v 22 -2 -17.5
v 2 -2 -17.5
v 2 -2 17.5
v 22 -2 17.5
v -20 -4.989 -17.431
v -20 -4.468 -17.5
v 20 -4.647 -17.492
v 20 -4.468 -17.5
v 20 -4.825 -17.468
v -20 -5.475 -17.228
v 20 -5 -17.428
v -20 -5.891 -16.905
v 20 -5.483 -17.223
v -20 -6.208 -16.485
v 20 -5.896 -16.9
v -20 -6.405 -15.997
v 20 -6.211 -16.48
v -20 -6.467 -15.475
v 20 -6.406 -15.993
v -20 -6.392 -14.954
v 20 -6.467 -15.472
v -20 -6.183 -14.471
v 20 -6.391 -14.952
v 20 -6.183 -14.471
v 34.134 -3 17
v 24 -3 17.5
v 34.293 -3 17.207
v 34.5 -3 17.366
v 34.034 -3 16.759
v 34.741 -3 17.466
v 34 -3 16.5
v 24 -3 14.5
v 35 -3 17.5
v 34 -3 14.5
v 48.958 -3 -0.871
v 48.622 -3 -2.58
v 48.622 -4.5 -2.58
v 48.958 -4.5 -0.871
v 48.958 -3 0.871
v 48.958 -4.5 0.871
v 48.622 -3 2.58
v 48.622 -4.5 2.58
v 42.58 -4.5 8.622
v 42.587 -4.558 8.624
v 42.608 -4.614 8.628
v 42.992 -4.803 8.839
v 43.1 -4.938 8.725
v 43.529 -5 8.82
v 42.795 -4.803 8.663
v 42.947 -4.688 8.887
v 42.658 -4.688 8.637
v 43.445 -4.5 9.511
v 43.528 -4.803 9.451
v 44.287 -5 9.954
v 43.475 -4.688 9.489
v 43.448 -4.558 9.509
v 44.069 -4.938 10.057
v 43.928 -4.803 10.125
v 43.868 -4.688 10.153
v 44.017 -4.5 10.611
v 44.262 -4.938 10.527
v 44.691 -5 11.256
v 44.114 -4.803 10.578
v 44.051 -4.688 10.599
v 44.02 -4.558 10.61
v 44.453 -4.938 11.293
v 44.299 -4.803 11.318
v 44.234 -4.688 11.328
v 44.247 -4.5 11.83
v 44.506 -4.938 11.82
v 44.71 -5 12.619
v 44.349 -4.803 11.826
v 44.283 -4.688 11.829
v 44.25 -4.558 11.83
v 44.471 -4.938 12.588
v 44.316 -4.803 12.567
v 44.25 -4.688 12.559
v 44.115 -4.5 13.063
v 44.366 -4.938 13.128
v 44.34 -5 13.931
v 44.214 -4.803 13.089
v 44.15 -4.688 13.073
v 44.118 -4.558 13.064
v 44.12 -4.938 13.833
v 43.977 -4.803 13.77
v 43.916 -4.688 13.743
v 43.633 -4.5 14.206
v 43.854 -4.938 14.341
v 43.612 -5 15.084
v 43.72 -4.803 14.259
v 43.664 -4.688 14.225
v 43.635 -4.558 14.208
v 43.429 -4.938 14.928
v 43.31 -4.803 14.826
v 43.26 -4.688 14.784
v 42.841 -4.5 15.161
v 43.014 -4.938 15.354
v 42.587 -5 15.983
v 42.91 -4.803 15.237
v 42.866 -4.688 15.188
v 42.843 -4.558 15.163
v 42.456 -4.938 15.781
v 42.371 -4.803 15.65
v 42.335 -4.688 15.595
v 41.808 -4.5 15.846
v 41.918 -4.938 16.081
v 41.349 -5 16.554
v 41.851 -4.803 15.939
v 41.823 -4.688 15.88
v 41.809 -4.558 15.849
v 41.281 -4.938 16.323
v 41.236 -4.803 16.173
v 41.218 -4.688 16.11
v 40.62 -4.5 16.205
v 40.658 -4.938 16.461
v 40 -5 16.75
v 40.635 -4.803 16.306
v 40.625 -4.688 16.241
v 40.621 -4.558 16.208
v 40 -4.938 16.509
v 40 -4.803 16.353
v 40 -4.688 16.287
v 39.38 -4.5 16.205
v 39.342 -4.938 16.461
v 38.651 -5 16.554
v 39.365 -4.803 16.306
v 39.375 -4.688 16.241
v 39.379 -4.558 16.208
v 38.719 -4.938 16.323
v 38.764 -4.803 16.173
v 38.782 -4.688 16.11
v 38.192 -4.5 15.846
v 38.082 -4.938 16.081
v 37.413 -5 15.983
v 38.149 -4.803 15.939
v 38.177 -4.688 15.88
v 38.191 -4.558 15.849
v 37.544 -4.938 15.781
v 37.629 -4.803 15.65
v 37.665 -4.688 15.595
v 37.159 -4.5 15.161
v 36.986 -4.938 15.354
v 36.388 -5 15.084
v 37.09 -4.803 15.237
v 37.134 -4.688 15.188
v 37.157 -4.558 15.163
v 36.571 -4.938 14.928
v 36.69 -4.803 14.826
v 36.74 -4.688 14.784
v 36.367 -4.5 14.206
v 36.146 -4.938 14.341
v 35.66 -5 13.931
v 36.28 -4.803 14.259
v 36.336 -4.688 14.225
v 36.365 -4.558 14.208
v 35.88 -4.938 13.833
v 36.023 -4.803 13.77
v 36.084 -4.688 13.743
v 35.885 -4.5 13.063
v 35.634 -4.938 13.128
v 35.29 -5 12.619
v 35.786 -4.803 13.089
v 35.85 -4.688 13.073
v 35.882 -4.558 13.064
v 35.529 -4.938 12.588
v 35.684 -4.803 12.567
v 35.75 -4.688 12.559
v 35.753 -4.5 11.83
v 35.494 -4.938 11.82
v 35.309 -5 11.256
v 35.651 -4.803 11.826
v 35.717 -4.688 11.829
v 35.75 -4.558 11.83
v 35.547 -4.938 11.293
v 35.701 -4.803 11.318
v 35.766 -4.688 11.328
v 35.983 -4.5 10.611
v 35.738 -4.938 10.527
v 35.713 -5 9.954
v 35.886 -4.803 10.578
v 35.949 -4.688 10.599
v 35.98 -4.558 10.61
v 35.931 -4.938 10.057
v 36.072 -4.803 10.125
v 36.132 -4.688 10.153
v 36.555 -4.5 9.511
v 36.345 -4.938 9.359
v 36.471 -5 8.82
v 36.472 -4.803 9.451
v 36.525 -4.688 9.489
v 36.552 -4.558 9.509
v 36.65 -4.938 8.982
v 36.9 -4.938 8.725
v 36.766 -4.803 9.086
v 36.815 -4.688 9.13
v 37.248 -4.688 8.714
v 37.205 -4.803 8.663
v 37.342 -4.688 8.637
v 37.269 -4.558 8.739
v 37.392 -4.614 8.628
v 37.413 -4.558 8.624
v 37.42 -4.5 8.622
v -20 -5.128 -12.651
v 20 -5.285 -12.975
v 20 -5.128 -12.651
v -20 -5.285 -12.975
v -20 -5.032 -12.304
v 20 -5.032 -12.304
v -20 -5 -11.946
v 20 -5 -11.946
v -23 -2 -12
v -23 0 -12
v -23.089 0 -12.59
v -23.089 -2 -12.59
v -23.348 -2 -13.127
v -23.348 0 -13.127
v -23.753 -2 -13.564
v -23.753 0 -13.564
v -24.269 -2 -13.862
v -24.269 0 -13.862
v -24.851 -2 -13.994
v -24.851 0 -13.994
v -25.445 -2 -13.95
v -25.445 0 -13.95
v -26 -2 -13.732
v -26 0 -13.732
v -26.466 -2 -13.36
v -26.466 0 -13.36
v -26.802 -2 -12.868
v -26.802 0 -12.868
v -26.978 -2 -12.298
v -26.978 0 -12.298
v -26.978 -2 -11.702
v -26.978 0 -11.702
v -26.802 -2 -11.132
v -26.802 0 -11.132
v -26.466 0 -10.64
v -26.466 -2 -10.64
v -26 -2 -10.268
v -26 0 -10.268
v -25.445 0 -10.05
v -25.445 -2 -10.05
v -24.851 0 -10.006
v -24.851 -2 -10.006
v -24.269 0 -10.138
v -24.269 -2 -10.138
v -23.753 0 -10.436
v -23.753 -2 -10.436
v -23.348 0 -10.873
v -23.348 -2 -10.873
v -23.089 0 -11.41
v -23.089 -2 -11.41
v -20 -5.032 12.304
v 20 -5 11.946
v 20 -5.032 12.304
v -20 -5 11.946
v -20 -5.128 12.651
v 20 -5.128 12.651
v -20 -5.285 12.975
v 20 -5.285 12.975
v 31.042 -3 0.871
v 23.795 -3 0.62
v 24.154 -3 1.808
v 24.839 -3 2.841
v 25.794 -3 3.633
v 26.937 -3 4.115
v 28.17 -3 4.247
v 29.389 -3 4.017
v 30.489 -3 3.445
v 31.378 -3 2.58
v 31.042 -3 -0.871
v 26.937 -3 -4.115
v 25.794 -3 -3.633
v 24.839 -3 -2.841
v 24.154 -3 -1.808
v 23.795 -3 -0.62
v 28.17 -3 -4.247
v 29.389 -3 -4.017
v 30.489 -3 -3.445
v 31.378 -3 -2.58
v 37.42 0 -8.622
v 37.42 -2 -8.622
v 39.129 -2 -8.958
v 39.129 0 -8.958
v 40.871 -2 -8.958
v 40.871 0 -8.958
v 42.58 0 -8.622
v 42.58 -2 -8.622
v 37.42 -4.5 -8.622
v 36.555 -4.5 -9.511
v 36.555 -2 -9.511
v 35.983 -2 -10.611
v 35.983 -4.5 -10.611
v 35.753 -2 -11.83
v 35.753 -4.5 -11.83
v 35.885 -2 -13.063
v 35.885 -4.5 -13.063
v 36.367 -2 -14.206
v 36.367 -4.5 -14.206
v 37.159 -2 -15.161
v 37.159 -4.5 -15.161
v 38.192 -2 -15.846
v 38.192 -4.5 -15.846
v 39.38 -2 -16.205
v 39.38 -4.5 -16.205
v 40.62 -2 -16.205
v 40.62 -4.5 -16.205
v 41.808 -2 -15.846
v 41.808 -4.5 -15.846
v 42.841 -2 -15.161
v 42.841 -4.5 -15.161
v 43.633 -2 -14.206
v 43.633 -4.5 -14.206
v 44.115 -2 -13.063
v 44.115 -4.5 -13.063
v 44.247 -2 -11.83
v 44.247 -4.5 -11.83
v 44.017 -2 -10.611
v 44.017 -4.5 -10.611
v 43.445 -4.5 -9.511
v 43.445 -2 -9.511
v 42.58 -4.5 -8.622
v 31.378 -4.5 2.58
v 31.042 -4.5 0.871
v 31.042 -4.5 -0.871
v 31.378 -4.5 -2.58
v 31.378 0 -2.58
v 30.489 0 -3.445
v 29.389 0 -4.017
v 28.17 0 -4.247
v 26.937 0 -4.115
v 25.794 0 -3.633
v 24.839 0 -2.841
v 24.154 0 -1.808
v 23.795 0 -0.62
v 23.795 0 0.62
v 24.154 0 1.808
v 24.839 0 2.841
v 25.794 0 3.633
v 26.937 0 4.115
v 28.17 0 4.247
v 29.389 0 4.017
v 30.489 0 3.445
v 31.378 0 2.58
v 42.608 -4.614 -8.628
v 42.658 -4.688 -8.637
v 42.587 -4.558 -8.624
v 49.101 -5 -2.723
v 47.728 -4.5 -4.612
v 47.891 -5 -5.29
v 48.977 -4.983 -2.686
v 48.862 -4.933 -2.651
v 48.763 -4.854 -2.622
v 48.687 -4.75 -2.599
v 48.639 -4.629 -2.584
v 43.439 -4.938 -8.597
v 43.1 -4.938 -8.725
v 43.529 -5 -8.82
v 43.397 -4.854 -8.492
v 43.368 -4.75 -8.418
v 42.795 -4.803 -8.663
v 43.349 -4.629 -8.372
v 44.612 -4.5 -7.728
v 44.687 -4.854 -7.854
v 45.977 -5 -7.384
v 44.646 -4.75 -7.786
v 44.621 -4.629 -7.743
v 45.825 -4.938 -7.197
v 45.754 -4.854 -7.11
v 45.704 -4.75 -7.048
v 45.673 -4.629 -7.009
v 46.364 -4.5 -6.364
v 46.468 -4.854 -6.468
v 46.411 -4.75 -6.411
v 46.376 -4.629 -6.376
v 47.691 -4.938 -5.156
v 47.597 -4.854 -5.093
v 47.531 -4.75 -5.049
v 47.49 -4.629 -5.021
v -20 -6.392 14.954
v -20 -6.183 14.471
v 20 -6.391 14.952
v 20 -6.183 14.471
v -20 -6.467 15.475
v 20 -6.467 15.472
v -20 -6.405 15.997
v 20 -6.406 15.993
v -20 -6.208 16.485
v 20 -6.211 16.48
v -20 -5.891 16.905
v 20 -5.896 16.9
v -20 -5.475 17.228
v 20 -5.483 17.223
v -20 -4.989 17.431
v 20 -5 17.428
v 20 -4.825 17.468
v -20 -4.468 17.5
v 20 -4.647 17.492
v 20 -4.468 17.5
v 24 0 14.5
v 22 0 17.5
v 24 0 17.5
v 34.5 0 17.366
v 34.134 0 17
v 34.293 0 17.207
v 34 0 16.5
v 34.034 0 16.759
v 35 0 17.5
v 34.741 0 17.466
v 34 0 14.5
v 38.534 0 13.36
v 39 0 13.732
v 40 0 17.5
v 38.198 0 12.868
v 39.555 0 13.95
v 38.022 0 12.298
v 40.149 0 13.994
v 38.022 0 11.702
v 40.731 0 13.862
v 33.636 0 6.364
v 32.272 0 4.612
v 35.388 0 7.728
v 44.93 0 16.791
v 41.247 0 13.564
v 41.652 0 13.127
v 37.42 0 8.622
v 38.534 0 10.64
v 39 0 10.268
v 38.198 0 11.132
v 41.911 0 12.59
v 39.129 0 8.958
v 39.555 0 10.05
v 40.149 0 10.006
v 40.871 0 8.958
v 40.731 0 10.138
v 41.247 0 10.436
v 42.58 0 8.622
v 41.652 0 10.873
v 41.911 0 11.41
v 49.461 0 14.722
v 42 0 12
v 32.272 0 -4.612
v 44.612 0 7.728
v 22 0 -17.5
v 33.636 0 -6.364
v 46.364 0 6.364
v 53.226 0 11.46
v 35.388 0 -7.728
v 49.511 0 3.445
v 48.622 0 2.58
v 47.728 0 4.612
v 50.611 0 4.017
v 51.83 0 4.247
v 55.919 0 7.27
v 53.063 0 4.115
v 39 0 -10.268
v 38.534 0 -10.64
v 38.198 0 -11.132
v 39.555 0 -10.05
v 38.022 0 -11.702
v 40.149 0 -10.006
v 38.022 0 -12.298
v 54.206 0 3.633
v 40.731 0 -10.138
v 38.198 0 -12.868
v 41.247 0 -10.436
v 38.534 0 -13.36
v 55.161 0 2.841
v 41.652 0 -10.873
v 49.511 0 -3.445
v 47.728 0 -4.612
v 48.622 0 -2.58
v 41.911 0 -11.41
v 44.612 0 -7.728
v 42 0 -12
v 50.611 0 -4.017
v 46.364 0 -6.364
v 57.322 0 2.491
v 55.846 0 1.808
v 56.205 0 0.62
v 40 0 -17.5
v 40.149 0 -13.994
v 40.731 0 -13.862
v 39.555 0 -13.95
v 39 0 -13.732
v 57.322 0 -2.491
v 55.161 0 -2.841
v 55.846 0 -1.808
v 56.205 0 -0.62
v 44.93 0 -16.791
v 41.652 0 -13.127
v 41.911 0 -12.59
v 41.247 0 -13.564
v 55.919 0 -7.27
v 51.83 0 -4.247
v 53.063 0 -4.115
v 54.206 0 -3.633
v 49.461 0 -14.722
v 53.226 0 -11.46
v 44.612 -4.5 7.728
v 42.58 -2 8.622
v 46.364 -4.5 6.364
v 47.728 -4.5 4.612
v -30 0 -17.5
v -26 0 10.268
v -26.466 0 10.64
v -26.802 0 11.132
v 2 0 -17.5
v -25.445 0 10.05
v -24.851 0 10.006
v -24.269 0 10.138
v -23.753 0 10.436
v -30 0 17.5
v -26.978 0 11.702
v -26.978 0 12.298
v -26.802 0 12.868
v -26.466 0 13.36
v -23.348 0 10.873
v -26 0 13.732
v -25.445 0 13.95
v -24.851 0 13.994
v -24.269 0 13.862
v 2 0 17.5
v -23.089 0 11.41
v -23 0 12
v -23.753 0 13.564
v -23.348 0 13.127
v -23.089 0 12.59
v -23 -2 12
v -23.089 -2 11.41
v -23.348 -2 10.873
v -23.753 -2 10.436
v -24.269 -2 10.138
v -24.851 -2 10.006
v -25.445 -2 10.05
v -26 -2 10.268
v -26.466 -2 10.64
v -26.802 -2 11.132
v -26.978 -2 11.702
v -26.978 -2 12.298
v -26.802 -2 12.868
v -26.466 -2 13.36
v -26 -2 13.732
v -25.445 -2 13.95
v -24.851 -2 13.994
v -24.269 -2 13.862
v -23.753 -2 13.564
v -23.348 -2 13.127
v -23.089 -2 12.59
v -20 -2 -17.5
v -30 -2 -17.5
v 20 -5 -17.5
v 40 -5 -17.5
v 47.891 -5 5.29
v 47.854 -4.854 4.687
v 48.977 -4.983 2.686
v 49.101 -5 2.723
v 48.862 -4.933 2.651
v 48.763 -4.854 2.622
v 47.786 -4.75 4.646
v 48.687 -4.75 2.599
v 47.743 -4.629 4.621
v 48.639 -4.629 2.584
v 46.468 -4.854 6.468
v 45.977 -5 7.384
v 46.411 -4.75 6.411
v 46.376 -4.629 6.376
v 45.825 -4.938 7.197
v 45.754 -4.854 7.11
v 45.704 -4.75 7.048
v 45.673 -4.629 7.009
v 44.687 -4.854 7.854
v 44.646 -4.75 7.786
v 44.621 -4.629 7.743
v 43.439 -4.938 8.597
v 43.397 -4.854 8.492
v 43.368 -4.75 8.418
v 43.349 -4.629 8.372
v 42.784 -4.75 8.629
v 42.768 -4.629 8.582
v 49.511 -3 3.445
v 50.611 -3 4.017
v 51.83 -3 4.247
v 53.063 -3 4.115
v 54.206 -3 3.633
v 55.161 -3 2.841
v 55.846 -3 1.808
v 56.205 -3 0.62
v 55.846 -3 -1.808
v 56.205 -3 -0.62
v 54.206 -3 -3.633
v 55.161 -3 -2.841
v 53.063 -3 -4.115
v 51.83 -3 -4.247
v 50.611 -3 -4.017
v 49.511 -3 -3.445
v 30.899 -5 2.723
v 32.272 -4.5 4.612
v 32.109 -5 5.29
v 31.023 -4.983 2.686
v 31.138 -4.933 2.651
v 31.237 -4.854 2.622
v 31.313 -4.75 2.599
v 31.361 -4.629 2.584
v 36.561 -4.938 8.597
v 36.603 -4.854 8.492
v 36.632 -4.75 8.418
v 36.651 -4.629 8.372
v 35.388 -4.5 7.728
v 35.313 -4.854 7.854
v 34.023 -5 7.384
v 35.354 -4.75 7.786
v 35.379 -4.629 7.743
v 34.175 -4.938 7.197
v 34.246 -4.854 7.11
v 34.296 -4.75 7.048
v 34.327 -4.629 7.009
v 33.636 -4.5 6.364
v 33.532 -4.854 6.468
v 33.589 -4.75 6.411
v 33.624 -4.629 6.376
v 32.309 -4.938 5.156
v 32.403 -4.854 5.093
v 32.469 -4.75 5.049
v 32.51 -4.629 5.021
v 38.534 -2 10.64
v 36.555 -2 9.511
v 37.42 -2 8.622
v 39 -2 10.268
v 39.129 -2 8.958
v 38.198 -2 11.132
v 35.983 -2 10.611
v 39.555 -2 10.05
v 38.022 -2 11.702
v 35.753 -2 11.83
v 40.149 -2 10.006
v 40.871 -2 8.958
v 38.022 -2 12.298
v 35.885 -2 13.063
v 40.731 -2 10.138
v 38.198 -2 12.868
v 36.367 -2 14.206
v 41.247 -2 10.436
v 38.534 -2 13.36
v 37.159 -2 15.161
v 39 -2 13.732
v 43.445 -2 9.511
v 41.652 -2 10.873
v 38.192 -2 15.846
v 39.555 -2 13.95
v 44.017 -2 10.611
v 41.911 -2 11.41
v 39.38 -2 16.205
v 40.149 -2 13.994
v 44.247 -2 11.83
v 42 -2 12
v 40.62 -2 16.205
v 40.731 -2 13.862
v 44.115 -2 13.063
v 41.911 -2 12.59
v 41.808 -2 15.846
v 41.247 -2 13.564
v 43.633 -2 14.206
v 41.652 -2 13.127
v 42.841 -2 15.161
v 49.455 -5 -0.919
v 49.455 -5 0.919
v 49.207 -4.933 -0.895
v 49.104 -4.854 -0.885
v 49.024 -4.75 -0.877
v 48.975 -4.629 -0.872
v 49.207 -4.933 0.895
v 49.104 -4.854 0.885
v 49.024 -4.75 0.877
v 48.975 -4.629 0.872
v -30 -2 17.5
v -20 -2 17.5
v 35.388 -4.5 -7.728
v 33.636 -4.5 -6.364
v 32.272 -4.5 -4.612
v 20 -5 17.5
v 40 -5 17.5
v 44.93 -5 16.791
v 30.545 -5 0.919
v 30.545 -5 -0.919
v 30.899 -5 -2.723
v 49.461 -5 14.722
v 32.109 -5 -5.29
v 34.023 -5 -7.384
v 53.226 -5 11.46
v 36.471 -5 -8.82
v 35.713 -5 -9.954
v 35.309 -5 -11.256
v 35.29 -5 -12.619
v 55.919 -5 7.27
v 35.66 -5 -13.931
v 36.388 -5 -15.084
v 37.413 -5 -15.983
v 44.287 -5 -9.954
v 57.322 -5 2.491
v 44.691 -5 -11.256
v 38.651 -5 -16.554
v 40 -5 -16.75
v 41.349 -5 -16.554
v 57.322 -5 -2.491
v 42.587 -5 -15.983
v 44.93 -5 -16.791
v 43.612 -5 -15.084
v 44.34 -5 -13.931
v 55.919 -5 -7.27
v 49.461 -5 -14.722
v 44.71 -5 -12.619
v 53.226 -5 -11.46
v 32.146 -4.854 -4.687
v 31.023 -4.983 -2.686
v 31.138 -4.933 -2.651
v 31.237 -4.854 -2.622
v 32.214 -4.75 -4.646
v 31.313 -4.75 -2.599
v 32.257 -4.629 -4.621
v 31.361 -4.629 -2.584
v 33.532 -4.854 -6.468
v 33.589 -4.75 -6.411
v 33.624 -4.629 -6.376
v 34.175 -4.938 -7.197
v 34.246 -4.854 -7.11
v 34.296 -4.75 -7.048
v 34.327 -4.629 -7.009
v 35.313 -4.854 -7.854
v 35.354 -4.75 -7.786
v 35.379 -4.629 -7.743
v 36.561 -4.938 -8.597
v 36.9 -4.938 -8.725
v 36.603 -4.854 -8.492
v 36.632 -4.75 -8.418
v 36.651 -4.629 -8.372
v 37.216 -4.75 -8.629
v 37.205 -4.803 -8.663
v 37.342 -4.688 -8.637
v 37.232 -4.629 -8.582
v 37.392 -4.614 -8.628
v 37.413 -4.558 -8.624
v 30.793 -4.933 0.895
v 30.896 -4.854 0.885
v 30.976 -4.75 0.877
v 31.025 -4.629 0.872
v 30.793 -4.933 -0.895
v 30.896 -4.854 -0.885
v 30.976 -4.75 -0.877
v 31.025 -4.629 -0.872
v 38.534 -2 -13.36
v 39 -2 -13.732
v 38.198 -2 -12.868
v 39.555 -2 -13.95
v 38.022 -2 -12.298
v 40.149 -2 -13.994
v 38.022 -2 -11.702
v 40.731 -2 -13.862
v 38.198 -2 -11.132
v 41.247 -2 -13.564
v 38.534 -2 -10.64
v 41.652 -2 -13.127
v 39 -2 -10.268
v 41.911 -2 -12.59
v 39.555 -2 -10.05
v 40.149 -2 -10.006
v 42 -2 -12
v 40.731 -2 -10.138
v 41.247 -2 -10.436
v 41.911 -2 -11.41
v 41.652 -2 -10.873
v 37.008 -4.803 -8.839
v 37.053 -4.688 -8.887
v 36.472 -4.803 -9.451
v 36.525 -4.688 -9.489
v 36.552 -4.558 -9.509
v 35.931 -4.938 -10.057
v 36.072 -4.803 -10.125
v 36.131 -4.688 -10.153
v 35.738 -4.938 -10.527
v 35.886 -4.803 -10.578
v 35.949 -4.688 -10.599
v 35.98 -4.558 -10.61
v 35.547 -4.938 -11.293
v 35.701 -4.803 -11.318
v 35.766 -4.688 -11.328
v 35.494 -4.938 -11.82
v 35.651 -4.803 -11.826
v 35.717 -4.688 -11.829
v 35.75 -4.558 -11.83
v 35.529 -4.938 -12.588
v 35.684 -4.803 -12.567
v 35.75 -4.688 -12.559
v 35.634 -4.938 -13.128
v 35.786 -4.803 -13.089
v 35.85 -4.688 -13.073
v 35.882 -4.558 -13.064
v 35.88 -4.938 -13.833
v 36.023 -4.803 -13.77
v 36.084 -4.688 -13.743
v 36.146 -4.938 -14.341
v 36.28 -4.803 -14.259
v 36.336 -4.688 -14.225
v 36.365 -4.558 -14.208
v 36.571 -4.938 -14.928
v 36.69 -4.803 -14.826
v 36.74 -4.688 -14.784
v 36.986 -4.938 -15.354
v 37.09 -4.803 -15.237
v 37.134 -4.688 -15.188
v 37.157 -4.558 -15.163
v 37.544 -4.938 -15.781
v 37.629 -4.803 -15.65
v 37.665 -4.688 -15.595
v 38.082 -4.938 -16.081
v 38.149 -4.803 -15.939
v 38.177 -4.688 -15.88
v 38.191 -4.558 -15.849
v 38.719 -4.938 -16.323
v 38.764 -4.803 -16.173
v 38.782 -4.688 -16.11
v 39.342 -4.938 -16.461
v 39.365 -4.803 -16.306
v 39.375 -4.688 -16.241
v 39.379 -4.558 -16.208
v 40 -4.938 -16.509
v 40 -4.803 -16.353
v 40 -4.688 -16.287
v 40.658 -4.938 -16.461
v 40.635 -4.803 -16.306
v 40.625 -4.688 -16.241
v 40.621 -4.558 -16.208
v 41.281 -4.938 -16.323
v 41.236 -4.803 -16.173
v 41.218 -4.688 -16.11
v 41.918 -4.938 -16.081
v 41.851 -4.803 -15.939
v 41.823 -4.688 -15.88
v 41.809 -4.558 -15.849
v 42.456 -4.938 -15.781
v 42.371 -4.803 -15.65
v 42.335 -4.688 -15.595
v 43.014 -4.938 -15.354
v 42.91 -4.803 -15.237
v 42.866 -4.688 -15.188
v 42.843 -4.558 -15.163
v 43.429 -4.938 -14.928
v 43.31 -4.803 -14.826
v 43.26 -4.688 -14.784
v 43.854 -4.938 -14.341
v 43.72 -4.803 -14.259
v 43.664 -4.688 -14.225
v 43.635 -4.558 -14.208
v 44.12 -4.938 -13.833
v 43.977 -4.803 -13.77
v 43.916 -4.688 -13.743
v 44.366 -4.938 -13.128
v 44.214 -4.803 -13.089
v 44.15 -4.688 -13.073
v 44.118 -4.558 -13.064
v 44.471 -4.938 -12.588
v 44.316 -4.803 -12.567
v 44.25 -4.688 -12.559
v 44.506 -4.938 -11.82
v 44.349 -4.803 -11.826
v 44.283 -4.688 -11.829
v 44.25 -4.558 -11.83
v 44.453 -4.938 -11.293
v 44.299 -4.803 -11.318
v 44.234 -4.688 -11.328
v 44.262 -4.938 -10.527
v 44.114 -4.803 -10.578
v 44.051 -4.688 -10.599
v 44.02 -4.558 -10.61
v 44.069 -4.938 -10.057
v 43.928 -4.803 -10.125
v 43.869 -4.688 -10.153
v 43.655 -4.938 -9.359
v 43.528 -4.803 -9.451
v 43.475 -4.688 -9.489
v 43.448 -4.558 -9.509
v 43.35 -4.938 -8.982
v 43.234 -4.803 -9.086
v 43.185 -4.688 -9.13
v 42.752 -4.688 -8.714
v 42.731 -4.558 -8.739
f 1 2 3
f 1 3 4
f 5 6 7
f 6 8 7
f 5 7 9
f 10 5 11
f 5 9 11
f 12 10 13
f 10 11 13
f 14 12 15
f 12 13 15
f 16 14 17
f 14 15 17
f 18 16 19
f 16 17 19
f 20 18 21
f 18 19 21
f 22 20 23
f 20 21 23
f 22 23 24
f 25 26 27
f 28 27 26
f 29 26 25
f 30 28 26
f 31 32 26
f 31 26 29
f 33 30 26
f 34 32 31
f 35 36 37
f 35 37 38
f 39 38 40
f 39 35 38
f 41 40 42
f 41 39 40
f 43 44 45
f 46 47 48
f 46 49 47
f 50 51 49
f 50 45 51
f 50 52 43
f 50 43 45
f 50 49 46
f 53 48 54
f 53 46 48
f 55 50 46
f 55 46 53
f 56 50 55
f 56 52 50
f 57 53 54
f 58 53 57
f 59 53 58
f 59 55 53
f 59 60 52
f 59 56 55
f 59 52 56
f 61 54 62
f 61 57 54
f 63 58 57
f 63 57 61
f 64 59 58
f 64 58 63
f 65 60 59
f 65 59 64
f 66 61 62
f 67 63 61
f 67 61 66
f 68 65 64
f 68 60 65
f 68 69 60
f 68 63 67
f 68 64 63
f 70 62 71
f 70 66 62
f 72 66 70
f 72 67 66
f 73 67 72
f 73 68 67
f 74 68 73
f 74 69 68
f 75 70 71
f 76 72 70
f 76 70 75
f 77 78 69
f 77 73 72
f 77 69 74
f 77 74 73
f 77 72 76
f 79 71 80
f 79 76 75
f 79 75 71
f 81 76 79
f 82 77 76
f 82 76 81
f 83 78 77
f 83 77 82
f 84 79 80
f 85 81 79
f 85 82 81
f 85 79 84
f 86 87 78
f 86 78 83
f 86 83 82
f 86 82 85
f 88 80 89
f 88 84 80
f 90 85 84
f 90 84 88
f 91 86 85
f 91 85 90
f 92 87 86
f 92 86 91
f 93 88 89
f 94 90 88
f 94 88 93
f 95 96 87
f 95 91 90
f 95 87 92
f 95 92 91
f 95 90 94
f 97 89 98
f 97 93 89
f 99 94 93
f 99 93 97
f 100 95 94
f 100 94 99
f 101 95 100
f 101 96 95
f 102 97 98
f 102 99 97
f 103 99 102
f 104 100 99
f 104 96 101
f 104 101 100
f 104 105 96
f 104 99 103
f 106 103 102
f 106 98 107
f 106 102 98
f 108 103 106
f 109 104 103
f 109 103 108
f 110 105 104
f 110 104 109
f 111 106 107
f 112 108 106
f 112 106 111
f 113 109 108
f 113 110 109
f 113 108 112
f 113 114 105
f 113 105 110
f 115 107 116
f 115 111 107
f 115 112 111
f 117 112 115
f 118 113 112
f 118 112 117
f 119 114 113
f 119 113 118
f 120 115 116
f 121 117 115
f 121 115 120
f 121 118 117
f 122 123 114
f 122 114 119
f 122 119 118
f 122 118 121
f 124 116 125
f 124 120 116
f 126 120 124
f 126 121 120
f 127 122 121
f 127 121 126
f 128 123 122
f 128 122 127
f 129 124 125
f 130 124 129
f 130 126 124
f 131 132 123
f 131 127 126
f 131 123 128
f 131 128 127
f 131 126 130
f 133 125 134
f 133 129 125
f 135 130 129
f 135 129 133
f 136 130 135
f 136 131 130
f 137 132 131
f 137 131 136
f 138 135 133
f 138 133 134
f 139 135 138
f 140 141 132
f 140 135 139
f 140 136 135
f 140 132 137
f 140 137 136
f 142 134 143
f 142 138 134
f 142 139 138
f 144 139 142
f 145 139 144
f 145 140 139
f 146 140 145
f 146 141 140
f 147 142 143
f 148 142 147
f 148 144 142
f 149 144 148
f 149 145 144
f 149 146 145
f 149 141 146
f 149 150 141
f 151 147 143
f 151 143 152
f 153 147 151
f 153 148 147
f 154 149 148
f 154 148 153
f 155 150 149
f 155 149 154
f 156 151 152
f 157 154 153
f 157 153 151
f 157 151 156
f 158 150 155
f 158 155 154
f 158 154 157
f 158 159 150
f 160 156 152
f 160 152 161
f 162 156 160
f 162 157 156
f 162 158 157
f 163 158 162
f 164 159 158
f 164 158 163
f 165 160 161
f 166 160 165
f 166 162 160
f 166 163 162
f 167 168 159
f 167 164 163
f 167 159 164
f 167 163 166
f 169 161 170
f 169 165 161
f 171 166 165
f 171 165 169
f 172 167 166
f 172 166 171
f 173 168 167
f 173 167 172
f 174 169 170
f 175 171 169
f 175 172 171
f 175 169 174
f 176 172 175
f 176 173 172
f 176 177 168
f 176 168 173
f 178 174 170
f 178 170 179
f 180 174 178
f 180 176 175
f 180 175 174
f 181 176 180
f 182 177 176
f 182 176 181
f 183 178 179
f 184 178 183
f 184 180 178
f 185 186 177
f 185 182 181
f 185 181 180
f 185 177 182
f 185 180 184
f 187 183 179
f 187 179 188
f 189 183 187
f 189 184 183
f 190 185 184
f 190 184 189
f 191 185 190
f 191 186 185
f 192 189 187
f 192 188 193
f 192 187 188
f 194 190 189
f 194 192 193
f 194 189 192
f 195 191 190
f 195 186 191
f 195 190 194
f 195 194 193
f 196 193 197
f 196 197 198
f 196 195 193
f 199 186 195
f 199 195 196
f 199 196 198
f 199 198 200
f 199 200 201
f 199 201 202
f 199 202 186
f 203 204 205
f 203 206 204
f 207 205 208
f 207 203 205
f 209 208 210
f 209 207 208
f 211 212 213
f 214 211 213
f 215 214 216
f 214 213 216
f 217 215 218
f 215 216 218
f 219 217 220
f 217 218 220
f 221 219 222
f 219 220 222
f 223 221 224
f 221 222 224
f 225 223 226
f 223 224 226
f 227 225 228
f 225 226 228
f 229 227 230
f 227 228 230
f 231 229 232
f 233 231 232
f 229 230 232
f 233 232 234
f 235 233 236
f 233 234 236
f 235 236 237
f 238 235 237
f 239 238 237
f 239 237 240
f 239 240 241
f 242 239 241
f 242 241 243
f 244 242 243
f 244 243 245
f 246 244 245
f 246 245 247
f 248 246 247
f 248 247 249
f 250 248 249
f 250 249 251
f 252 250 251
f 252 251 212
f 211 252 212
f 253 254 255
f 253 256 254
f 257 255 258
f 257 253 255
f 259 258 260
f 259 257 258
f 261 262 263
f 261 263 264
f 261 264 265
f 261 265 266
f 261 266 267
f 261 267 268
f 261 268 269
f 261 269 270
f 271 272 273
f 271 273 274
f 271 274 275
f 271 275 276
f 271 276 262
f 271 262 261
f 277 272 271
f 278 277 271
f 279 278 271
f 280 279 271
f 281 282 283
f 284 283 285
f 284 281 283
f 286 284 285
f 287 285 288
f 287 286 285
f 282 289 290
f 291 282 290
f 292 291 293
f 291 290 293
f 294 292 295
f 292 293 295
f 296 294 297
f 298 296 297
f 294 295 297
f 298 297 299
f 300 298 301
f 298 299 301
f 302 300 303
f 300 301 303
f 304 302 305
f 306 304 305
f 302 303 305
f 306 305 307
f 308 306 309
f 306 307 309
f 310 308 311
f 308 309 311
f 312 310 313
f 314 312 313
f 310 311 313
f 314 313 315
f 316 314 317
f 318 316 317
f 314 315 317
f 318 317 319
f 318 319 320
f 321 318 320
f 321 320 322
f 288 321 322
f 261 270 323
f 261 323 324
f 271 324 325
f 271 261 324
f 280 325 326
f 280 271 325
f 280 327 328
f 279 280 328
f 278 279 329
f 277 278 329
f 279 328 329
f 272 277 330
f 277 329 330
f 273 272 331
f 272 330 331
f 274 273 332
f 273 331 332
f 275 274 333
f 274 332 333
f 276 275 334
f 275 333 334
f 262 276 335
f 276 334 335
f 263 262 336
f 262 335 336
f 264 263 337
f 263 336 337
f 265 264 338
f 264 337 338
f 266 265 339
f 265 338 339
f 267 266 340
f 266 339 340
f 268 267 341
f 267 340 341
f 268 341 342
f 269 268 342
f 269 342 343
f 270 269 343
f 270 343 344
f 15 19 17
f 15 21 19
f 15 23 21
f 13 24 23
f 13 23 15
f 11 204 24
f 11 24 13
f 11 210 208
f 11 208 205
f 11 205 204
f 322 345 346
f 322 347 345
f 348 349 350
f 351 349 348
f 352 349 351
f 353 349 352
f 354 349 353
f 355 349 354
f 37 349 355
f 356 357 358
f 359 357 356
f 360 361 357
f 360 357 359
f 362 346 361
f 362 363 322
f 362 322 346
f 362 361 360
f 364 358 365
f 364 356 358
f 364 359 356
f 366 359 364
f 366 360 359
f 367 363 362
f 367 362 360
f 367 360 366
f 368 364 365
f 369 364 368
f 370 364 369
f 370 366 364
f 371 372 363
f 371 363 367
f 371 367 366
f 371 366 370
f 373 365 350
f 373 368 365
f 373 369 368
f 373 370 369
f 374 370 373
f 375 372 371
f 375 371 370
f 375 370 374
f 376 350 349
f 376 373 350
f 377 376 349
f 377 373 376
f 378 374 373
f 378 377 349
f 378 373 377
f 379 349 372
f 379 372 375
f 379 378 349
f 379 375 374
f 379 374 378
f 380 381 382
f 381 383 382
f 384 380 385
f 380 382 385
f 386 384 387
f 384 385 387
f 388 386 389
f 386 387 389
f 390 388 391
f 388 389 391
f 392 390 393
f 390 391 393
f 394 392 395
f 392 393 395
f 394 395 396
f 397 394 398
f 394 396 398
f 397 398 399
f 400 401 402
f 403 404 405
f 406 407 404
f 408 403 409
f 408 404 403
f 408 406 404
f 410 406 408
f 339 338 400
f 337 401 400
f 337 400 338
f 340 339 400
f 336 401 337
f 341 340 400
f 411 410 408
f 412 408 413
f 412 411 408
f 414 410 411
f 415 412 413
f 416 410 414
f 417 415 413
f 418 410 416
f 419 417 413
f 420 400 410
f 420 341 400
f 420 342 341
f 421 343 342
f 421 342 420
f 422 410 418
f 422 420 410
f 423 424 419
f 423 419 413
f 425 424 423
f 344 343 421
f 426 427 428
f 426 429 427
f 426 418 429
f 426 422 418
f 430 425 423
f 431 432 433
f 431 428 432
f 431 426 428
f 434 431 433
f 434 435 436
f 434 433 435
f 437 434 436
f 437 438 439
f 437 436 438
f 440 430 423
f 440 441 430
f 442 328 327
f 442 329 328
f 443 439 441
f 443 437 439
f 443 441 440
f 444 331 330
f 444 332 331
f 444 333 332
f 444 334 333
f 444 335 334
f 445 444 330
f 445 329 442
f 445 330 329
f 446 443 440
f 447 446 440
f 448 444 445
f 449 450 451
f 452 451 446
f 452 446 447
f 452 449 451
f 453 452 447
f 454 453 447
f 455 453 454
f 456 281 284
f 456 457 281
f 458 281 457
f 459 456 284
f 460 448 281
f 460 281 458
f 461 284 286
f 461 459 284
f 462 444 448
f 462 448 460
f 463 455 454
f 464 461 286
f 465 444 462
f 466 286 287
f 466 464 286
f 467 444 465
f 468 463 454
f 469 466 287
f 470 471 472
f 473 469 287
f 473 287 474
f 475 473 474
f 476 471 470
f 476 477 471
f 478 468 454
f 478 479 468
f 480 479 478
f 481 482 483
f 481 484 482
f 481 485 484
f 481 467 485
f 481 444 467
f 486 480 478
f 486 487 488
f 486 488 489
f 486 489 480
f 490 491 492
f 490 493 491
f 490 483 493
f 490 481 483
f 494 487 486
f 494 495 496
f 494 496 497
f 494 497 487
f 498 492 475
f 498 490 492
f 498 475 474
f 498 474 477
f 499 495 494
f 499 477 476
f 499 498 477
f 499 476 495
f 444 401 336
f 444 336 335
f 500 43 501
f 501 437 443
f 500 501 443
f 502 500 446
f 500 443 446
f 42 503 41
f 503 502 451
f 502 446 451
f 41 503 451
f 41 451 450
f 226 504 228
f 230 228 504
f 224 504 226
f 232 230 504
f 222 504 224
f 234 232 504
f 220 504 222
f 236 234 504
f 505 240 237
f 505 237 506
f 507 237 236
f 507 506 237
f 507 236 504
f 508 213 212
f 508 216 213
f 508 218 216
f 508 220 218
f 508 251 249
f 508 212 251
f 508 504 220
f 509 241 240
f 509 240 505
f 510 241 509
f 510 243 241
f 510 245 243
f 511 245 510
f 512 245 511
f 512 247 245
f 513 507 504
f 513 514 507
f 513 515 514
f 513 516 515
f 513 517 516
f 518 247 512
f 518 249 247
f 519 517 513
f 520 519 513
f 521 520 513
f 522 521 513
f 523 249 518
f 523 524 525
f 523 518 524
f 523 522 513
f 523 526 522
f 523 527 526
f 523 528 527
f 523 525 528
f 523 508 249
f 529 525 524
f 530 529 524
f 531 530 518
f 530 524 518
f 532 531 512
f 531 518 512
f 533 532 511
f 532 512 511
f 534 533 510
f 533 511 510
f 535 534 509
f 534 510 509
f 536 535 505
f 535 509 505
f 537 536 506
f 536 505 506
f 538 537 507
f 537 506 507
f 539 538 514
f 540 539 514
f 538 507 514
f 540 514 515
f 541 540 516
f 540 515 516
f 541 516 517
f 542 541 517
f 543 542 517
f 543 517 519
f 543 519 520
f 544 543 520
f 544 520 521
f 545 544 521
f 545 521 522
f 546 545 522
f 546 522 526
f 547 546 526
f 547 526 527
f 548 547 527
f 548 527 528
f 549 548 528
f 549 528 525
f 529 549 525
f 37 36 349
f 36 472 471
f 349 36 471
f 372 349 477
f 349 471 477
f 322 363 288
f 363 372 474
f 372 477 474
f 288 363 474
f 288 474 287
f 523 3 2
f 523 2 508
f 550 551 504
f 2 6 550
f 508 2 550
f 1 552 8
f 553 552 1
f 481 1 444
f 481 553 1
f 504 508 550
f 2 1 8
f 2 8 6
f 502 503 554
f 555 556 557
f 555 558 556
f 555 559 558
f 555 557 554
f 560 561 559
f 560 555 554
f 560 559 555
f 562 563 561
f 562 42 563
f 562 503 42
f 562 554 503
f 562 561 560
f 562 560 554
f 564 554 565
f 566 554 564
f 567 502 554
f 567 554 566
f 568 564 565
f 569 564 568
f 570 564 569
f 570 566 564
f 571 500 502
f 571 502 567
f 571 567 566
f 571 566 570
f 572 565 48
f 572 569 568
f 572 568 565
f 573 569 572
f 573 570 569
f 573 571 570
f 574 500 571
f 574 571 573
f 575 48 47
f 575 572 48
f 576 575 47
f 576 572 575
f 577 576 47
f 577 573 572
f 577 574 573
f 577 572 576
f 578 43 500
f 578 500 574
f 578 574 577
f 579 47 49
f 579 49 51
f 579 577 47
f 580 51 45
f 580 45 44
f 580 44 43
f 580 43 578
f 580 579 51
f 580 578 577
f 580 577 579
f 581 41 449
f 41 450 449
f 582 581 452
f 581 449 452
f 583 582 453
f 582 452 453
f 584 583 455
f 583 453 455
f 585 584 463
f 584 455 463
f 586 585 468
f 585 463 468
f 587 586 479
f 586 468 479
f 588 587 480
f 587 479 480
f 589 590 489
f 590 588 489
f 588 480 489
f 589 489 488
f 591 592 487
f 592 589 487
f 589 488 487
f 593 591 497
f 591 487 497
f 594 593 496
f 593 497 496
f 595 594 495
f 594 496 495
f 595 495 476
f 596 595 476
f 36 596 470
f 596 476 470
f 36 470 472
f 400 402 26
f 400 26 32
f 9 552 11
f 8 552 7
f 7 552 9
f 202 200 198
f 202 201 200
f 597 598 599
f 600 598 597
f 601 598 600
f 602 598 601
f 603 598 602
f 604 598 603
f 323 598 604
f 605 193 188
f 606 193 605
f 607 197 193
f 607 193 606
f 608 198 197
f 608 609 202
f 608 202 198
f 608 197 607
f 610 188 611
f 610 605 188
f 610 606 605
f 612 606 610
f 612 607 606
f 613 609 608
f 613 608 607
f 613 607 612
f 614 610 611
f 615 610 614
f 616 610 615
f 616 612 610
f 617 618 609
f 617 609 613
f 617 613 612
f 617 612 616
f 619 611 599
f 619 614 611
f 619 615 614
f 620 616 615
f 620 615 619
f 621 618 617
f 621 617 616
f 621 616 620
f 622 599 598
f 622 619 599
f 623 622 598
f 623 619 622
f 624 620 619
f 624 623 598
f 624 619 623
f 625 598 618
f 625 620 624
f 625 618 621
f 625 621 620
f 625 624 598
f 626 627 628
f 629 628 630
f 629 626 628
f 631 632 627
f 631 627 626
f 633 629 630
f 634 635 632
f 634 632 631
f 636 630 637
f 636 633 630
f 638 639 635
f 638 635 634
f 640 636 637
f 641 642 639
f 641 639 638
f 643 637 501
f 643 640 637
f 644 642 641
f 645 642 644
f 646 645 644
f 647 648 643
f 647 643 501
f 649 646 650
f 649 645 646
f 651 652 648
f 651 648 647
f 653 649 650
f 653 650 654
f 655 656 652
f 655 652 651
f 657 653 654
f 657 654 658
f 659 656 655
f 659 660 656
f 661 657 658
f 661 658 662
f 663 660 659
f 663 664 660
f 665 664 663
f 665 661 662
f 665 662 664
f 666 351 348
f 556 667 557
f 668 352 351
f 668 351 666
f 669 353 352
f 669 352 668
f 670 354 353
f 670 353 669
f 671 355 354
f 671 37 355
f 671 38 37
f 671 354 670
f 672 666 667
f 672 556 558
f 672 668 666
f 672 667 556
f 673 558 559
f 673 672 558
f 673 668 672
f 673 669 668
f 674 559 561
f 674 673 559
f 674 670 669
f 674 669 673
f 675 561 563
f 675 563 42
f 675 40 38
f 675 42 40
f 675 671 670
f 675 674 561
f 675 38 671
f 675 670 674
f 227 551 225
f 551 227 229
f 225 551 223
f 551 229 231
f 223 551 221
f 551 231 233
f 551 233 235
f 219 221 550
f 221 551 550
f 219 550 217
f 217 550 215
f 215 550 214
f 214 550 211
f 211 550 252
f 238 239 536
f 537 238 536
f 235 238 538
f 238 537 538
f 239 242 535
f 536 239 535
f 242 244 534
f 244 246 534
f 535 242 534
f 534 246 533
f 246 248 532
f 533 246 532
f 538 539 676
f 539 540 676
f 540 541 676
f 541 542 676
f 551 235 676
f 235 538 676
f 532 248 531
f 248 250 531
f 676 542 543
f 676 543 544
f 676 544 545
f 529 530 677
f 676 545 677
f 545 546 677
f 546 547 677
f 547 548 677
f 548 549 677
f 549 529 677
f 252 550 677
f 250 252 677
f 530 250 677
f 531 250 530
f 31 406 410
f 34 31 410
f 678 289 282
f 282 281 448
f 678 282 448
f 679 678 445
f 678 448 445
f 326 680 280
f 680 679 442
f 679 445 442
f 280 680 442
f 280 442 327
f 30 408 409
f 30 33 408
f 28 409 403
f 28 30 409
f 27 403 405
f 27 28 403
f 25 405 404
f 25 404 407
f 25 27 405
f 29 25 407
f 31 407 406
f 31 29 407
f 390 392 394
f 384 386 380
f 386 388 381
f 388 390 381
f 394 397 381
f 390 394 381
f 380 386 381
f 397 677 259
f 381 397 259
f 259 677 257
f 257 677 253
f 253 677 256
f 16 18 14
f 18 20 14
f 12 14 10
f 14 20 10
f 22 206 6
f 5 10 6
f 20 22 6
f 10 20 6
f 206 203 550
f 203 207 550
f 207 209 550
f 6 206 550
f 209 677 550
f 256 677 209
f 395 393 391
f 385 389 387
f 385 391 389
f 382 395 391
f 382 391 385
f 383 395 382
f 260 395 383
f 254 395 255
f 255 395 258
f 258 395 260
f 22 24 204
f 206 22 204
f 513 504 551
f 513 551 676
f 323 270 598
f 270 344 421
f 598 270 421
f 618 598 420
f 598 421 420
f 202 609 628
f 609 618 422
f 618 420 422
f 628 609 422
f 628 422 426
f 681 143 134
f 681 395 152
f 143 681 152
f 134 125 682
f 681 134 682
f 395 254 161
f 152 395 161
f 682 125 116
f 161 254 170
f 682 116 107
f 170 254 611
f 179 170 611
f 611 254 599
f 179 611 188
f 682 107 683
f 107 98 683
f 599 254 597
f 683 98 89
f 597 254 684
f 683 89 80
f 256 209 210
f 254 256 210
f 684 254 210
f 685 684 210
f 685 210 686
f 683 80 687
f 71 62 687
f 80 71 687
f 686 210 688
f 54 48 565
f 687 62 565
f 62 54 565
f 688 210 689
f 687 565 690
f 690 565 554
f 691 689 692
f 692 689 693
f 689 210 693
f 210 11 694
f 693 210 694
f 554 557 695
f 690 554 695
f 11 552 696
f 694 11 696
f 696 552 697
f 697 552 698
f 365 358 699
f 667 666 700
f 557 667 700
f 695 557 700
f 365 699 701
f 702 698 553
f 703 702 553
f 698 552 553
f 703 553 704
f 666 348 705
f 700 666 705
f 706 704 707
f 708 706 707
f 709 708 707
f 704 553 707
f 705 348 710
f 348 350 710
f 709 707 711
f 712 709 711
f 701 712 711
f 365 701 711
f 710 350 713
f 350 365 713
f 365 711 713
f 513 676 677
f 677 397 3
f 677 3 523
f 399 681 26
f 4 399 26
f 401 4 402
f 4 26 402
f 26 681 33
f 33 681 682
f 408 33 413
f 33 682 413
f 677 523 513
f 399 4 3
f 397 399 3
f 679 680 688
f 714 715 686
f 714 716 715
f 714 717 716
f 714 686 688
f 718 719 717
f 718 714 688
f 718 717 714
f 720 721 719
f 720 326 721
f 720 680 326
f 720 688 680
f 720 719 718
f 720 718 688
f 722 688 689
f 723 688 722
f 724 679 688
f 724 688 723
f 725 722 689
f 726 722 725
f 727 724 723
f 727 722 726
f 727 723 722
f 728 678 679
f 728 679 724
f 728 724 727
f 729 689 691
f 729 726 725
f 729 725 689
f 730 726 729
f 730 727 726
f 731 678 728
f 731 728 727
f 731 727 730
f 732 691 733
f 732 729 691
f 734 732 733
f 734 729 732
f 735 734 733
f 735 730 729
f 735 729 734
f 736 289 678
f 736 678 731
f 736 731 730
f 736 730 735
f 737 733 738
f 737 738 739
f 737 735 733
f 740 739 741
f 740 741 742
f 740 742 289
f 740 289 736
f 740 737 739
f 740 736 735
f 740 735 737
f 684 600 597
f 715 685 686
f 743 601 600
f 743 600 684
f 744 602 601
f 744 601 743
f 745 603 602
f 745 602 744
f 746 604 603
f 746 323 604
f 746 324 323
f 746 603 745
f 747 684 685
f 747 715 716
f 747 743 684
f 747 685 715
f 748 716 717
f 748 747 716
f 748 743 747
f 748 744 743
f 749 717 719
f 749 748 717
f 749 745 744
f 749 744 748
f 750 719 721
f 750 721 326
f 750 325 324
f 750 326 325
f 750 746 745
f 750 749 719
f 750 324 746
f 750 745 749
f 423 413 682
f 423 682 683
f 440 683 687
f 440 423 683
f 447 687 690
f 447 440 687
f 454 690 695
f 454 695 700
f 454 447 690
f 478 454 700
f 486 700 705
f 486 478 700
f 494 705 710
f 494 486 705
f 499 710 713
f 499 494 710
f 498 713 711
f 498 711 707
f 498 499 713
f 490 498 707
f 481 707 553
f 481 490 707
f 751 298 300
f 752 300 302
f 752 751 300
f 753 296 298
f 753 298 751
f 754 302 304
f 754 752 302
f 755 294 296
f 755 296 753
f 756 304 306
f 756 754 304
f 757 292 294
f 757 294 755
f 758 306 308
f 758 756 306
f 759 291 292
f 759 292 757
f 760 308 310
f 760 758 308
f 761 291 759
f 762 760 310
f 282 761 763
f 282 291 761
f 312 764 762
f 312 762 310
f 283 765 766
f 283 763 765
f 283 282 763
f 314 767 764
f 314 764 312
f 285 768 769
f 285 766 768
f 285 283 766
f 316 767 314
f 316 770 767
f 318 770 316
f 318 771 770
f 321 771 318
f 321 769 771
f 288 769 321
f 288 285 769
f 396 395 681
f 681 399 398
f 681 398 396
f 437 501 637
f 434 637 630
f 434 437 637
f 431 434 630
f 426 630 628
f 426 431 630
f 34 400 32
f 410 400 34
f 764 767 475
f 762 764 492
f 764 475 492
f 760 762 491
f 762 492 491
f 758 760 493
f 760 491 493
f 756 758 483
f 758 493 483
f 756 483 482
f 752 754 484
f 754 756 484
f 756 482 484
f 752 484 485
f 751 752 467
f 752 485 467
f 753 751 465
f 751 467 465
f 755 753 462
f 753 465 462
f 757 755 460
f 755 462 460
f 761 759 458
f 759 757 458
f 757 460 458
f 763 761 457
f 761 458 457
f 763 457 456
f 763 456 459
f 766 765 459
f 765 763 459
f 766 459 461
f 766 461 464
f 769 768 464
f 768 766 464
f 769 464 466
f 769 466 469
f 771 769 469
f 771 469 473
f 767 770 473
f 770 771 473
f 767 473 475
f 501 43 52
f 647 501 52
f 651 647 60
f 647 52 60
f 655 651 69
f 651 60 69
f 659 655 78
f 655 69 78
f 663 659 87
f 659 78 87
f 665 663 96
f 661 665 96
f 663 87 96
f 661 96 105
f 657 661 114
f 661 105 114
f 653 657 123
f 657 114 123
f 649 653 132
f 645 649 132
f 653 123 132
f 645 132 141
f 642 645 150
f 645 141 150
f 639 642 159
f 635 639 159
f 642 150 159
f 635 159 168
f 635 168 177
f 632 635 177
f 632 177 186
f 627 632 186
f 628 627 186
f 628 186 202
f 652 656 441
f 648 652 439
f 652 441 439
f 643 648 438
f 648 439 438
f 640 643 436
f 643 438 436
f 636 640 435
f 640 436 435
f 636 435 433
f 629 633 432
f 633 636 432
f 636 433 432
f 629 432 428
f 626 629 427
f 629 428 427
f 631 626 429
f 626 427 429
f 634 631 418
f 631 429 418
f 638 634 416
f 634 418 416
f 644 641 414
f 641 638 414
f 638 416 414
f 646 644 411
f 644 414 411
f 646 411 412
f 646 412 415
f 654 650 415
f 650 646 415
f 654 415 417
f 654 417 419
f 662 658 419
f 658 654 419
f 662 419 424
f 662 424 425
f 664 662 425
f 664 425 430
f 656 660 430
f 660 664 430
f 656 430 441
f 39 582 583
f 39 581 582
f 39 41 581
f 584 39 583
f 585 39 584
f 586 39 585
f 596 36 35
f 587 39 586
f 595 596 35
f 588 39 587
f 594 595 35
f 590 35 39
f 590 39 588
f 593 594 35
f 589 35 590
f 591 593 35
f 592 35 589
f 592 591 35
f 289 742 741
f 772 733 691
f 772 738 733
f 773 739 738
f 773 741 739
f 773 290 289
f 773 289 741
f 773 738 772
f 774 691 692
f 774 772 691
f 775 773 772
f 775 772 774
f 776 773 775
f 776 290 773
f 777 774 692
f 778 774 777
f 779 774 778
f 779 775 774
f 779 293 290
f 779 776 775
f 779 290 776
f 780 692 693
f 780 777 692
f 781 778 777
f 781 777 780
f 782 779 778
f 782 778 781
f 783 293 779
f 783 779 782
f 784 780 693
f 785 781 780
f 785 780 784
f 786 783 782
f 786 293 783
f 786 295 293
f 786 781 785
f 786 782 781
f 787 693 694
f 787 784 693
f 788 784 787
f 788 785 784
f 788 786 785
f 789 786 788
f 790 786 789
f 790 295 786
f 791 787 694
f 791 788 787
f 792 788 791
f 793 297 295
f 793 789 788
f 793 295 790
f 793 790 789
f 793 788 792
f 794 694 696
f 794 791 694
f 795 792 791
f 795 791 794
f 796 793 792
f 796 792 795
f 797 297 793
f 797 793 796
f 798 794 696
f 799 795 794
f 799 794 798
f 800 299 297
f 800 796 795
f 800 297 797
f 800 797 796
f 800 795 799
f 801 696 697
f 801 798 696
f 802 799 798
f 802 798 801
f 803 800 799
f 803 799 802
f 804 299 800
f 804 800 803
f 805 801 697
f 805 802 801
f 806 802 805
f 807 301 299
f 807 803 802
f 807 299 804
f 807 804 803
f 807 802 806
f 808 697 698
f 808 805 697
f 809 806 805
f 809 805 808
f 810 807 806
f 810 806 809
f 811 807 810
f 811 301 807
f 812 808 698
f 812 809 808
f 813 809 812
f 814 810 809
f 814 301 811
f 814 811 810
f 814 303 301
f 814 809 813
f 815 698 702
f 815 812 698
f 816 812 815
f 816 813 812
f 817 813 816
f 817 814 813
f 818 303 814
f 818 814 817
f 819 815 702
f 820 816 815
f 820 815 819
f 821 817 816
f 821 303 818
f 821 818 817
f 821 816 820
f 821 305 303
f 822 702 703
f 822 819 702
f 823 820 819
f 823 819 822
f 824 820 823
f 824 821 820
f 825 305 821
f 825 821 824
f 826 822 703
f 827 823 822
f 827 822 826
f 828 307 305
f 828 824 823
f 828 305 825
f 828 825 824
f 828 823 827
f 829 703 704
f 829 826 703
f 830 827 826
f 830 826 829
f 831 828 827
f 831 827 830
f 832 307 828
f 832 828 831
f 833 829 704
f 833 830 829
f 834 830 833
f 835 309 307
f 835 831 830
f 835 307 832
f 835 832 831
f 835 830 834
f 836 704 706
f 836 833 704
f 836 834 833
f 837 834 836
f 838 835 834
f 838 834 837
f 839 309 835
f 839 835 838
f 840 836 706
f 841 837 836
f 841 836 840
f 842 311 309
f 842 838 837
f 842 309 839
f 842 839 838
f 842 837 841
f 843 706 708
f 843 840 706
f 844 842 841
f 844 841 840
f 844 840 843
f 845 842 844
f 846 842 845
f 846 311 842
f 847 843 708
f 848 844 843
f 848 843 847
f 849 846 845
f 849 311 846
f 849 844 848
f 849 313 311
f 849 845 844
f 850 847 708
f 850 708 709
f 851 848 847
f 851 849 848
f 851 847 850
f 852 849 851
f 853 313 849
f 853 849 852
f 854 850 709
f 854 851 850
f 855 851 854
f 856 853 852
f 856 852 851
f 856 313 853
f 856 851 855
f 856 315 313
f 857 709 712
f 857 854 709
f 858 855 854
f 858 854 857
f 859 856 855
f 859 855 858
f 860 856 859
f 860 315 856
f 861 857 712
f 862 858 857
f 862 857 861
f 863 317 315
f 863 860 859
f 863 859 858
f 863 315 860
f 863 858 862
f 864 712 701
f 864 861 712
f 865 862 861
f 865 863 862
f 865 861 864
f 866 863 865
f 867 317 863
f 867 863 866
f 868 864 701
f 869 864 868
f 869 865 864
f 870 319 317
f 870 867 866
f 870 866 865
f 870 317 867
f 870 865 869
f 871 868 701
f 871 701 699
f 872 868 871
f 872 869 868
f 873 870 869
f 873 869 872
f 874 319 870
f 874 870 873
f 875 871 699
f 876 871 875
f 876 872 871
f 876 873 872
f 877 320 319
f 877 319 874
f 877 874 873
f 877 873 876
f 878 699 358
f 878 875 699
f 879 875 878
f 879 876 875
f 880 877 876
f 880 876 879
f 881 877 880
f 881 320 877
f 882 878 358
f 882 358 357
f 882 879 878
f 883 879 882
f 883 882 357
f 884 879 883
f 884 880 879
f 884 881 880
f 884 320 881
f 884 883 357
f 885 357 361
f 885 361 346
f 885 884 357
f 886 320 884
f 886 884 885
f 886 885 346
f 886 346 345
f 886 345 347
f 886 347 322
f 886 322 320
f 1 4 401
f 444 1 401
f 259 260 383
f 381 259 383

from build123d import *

# Parameters (mm, degrees)
SKETCH1_W               = 40
SKETCH1_H               = 35
BOSS_EXTRUDE1_DEPTH     = 8
CUT_EXTRUDE1_DEPTH      = 1
CUT_EXTRUDE1_DEPTH_BACK = 41
FILLET1_R               = 2
SKETCH6_R               = 2
BOSS_EXTRUDE2_DEPTH     = 5
CUT_EXTRUDE2_DEPTH      = 7.467619242
SKETCH6_7_R             = 4.25
CUT_EXTRUDE3_DEPTH      = 3
SKETCH7_W               = 10
SKETCH7_H               = 3
CUT_EXTRUDE4_DEPTH      = 3
FILLET2_R               = 1
SKETCH8_W               = 20
SKETCH8_H               = 2
CUT_EXTRUDE5_DEPTH      = 36
SKETCH10_R              = 4.25
SKETCH10_R_2            = 2
SKETCH10_R_3            = 9
CUT_EXTRUDE6_DEPTH      = 3
FILLET3_R               = 0.5
SKETCH5_W               = 35
SKETCH5_H               = 2
BOSS_EXTRUDE3_DEPTH     = 10
SKETCH12_R              = 2
CUT_EXTRUDE7_DEPTH      = 7.467619242


with BuildPart() as part:
    # Sketch1 → Boss-Extrude1 (new body)
    with BuildSketch(Plane(origin=(0, 0, 0), x_dir=(1, 0, 0), z_dir=(0, 1, 0))):
        Rectangle(SKETCH1_W, SKETCH1_H)
    extrude(amount=-BOSS_EXTRUDE1_DEPTH)

    # Sketch2 → Cut-Extrude1 (cut, two sides)
    with BuildSketch(Plane(origin=(20, 0, 0), x_dir=(0, 0, -1), z_dir=(1, 0, 0))) as cut_extrude1_sk:
        Polygon((-12.5, -5), (-17.5, -8), (0, -8), (0, -5), align=None)
        Polygon((0, -5), (0, -8), (17.5, -8), (12.5, -5), align=None)
    extrude(amount=CUT_EXTRUDE1_DEPTH, mode=Mode.SUBTRACT)
    extrude(cut_extrude1_sk.sketch, amount=-CUT_EXTRUDE1_DEPTH_BACK, mode=Mode.SUBTRACT)

    # Fillet1
    fillet1_edges = [part.edges().sort_by_distance(p)[0] for p in [
        (0, -8, -17.5),
        (0, -5, 12.5),
        (0, -5, -12.5),
        (0, -8, 17.5),
    ]]
    fillet(fillet1_edges, radius=FILLET1_R)

    # Sketch6 → Boss-Extrude2 (add)
    with BuildSketch(Plane(origin=(0, 0, 0), x_dir=(1, 0, 0), z_dir=(0, 1, 0))):
        with BuildLine():
            Line((20, 17.5), (20, -17.5))
            Line((20, -17.5), (40, -17.5))
            ThreePointArc((40, -17.5), (57.5, 0), (40, 17.5))
            Line((40, 17.5), (20, 17.5))
        make_face()
        with Locations((40, -12)):
            Circle(SKETCH6_R, mode=Mode.SUBTRACT)
        with BuildLine():
            ThreePointArc((37.420408929, -8.622395833), (40, -7.75), (42.579591071, -8.622395833))
            ThreePointArc((42.579591071, -8.622395833), (40, -9), (37.420408929, -8.622395833))
        make_face(mode=Mode.SUBTRACT)
        with BuildLine():
            ThreePointArc((31.377604167, -2.579591071), (31, 0), (31.377604167, 2.579591071))
            ThreePointArc((31.377604167, 2.579591071), (32.025997871, 1.361558352), (32.25, 0))
            ThreePointArc((32.25, 0), (32.025997871, -1.361558352), (31.377604167, -2.579591071))
        make_face(mode=Mode.SUBTRACT)
        with BuildLine():
            ThreePointArc((37.420408929, 8.622395833), (40, 9), (42.579591071, 8.622395833))
            ThreePointArc((42.579591071, 8.622395833), (40, 7.75), (37.420408929, 8.622395833))
        make_face(mode=Mode.SUBTRACT)
        with Locations((40, 12)):
            Circle(SKETCH6_R, mode=Mode.SUBTRACT)
        with BuildLine():
            ThreePointArc((48.622395833, -2.579591071), (47.75, 0), (48.622395833, 2.579591071))
            ThreePointArc((48.622395833, 2.579591071), (49, 0), (48.622395833, -2.579591071))
        make_face(mode=Mode.SUBTRACT)
    extrude(amount=-BOSS_EXTRUDE2_DEPTH)

    # Sketch6<6> → Cut-Extrude2 (cut, through all)
    with BuildSketch(Plane(origin=(0, 0, 0), x_dir=(1, 0, 0), z_dir=(0, 1, 0))):
        with BuildLine():
            ThreePointArc((37.420408929, 8.622395833), (33.636038969, 6.363961031), (31.377604167, 2.579591071))
            ThreePointArc((31.377604167, 2.579591071), (32.025997871, 1.361558352), (32.25, 0))
            ThreePointArc((32.25, 0), (32.025997871, -1.361558352), (31.377604167, -2.579591071))
            ThreePointArc((31.377604167, -2.579591071), (33.636038969, -6.363961031), (37.420408929, -8.622395833))
            ThreePointArc((37.420408929, -8.622395833), (40, -7.75), (42.579591071, -8.622395833))
            ThreePointArc((42.579591071, -8.622395833), (46.363961031, -6.363961031), (48.622395833, -2.579591071))
            ThreePointArc((48.622395833, -2.579591071), (47.75, 0), (48.622395833, 2.579591071))
            ThreePointArc((48.622395833, 2.579591071), (46.363961031, 6.363961031), (42.579591071, 8.622395833))
            ThreePointArc((42.579591071, 8.622395833), (40, 7.75), (37.420408929, 8.622395833))
        make_face()
    extrude(amount=-CUT_EXTRUDE2_DEPTH, mode=Mode.SUBTRACT)

    # Sketch6<7> → Cut-Extrude3 (cut)
    with BuildSketch(Plane(origin=(0, 0, 0), x_dir=(1, 0, 0), z_dir=(0, 1, 0))):
        with Locations((52, 0)):
            Circle(SKETCH6_7_R)
        with Locations((28, 0)):
            Circle(SKETCH6_7_R)
    extrude(amount=-CUT_EXTRUDE3_DEPTH, mode=Mode.SUBTRACT)

    # Sketch7 → Cut-Extrude4 (cut)
    with BuildSketch(Plane(origin=(0, 0, 0), x_dir=(1, 0, 0), z_dir=(0, 1, 0))):
        with Locations((29, -16)):
            Rectangle(SKETCH7_W, SKETCH7_H)
    extrude(amount=-CUT_EXTRUDE4_DEPTH, mode=Mode.SUBTRACT)

    # Fillet2
    fillet2_edges = [part.edges().sort_by_distance(p)[0] for p in [
        (34, -1.5, 17.5),
    ]]
    fillet(fillet2_edges, radius=FILLET2_R)

    # Sketch8 → Cut-Extrude5 (cut, through all)
    with BuildSketch(Plane.XY.offset(17.5)):
        with Locations((12, -1)):
            Rectangle(SKETCH8_W, SKETCH8_H)
    extrude(amount=-CUT_EXTRUDE5_DEPTH, mode=Mode.SUBTRACT)

    # Sketch10 → Cut-Extrude6 (cut)
    with BuildSketch(Plane.XZ.offset(5)):
        with Locations((40, -12)):
            Circle(SKETCH10_R)
        with Locations((40, -12)):
            Circle(SKETCH10_R_2, mode=Mode.SUBTRACT)
        with Locations((40, 0)):
            Circle(SKETCH10_R_3)
        with Locations((40, 12)):
            Circle(SKETCH10_R)
        with Locations((40, 12)):
            Circle(SKETCH10_R_2, mode=Mode.SUBTRACT)
        with Locations((40, 0)):
            Circle(SKETCH10_R_3)
    extrude(amount=-CUT_EXTRUDE6_DEPTH, mode=Mode.SUBTRACT)

    # Fillet3
    fillet3_edges = [part.edges().sort_by_distance(p)[0] for p in [
        (49, -5, 0),
        (40, -5, -16.25),
        (40, -5, 16.25),
        (31, -5, 0),
    ]]
    fillet(fillet3_edges, radius=FILLET3_R)

    # Sketch5 → Boss-Extrude3 (add)
    with BuildSketch(Plane.ZY.offset(20)):
        with Locations((0, -1)):
            Rectangle(SKETCH5_W, SKETCH5_H)
    extrude(amount=BOSS_EXTRUDE3_DEPTH)

    # Sketch12 → Cut-Extrude7 (cut, through all)
    with BuildSketch(Plane(origin=(0, 0, 0), x_dir=(1, 0, 0), z_dir=(0, 1, 0))):
        with Locations((-25, 12)):
            Circle(SKETCH12_R)
        with Locations((-25, -12)):
            Circle(SKETCH12_R)
    extrude(amount=-CUT_EXTRUDE7_DEPTH, mode=Mode.SUBTRACT)


solid = part.part
